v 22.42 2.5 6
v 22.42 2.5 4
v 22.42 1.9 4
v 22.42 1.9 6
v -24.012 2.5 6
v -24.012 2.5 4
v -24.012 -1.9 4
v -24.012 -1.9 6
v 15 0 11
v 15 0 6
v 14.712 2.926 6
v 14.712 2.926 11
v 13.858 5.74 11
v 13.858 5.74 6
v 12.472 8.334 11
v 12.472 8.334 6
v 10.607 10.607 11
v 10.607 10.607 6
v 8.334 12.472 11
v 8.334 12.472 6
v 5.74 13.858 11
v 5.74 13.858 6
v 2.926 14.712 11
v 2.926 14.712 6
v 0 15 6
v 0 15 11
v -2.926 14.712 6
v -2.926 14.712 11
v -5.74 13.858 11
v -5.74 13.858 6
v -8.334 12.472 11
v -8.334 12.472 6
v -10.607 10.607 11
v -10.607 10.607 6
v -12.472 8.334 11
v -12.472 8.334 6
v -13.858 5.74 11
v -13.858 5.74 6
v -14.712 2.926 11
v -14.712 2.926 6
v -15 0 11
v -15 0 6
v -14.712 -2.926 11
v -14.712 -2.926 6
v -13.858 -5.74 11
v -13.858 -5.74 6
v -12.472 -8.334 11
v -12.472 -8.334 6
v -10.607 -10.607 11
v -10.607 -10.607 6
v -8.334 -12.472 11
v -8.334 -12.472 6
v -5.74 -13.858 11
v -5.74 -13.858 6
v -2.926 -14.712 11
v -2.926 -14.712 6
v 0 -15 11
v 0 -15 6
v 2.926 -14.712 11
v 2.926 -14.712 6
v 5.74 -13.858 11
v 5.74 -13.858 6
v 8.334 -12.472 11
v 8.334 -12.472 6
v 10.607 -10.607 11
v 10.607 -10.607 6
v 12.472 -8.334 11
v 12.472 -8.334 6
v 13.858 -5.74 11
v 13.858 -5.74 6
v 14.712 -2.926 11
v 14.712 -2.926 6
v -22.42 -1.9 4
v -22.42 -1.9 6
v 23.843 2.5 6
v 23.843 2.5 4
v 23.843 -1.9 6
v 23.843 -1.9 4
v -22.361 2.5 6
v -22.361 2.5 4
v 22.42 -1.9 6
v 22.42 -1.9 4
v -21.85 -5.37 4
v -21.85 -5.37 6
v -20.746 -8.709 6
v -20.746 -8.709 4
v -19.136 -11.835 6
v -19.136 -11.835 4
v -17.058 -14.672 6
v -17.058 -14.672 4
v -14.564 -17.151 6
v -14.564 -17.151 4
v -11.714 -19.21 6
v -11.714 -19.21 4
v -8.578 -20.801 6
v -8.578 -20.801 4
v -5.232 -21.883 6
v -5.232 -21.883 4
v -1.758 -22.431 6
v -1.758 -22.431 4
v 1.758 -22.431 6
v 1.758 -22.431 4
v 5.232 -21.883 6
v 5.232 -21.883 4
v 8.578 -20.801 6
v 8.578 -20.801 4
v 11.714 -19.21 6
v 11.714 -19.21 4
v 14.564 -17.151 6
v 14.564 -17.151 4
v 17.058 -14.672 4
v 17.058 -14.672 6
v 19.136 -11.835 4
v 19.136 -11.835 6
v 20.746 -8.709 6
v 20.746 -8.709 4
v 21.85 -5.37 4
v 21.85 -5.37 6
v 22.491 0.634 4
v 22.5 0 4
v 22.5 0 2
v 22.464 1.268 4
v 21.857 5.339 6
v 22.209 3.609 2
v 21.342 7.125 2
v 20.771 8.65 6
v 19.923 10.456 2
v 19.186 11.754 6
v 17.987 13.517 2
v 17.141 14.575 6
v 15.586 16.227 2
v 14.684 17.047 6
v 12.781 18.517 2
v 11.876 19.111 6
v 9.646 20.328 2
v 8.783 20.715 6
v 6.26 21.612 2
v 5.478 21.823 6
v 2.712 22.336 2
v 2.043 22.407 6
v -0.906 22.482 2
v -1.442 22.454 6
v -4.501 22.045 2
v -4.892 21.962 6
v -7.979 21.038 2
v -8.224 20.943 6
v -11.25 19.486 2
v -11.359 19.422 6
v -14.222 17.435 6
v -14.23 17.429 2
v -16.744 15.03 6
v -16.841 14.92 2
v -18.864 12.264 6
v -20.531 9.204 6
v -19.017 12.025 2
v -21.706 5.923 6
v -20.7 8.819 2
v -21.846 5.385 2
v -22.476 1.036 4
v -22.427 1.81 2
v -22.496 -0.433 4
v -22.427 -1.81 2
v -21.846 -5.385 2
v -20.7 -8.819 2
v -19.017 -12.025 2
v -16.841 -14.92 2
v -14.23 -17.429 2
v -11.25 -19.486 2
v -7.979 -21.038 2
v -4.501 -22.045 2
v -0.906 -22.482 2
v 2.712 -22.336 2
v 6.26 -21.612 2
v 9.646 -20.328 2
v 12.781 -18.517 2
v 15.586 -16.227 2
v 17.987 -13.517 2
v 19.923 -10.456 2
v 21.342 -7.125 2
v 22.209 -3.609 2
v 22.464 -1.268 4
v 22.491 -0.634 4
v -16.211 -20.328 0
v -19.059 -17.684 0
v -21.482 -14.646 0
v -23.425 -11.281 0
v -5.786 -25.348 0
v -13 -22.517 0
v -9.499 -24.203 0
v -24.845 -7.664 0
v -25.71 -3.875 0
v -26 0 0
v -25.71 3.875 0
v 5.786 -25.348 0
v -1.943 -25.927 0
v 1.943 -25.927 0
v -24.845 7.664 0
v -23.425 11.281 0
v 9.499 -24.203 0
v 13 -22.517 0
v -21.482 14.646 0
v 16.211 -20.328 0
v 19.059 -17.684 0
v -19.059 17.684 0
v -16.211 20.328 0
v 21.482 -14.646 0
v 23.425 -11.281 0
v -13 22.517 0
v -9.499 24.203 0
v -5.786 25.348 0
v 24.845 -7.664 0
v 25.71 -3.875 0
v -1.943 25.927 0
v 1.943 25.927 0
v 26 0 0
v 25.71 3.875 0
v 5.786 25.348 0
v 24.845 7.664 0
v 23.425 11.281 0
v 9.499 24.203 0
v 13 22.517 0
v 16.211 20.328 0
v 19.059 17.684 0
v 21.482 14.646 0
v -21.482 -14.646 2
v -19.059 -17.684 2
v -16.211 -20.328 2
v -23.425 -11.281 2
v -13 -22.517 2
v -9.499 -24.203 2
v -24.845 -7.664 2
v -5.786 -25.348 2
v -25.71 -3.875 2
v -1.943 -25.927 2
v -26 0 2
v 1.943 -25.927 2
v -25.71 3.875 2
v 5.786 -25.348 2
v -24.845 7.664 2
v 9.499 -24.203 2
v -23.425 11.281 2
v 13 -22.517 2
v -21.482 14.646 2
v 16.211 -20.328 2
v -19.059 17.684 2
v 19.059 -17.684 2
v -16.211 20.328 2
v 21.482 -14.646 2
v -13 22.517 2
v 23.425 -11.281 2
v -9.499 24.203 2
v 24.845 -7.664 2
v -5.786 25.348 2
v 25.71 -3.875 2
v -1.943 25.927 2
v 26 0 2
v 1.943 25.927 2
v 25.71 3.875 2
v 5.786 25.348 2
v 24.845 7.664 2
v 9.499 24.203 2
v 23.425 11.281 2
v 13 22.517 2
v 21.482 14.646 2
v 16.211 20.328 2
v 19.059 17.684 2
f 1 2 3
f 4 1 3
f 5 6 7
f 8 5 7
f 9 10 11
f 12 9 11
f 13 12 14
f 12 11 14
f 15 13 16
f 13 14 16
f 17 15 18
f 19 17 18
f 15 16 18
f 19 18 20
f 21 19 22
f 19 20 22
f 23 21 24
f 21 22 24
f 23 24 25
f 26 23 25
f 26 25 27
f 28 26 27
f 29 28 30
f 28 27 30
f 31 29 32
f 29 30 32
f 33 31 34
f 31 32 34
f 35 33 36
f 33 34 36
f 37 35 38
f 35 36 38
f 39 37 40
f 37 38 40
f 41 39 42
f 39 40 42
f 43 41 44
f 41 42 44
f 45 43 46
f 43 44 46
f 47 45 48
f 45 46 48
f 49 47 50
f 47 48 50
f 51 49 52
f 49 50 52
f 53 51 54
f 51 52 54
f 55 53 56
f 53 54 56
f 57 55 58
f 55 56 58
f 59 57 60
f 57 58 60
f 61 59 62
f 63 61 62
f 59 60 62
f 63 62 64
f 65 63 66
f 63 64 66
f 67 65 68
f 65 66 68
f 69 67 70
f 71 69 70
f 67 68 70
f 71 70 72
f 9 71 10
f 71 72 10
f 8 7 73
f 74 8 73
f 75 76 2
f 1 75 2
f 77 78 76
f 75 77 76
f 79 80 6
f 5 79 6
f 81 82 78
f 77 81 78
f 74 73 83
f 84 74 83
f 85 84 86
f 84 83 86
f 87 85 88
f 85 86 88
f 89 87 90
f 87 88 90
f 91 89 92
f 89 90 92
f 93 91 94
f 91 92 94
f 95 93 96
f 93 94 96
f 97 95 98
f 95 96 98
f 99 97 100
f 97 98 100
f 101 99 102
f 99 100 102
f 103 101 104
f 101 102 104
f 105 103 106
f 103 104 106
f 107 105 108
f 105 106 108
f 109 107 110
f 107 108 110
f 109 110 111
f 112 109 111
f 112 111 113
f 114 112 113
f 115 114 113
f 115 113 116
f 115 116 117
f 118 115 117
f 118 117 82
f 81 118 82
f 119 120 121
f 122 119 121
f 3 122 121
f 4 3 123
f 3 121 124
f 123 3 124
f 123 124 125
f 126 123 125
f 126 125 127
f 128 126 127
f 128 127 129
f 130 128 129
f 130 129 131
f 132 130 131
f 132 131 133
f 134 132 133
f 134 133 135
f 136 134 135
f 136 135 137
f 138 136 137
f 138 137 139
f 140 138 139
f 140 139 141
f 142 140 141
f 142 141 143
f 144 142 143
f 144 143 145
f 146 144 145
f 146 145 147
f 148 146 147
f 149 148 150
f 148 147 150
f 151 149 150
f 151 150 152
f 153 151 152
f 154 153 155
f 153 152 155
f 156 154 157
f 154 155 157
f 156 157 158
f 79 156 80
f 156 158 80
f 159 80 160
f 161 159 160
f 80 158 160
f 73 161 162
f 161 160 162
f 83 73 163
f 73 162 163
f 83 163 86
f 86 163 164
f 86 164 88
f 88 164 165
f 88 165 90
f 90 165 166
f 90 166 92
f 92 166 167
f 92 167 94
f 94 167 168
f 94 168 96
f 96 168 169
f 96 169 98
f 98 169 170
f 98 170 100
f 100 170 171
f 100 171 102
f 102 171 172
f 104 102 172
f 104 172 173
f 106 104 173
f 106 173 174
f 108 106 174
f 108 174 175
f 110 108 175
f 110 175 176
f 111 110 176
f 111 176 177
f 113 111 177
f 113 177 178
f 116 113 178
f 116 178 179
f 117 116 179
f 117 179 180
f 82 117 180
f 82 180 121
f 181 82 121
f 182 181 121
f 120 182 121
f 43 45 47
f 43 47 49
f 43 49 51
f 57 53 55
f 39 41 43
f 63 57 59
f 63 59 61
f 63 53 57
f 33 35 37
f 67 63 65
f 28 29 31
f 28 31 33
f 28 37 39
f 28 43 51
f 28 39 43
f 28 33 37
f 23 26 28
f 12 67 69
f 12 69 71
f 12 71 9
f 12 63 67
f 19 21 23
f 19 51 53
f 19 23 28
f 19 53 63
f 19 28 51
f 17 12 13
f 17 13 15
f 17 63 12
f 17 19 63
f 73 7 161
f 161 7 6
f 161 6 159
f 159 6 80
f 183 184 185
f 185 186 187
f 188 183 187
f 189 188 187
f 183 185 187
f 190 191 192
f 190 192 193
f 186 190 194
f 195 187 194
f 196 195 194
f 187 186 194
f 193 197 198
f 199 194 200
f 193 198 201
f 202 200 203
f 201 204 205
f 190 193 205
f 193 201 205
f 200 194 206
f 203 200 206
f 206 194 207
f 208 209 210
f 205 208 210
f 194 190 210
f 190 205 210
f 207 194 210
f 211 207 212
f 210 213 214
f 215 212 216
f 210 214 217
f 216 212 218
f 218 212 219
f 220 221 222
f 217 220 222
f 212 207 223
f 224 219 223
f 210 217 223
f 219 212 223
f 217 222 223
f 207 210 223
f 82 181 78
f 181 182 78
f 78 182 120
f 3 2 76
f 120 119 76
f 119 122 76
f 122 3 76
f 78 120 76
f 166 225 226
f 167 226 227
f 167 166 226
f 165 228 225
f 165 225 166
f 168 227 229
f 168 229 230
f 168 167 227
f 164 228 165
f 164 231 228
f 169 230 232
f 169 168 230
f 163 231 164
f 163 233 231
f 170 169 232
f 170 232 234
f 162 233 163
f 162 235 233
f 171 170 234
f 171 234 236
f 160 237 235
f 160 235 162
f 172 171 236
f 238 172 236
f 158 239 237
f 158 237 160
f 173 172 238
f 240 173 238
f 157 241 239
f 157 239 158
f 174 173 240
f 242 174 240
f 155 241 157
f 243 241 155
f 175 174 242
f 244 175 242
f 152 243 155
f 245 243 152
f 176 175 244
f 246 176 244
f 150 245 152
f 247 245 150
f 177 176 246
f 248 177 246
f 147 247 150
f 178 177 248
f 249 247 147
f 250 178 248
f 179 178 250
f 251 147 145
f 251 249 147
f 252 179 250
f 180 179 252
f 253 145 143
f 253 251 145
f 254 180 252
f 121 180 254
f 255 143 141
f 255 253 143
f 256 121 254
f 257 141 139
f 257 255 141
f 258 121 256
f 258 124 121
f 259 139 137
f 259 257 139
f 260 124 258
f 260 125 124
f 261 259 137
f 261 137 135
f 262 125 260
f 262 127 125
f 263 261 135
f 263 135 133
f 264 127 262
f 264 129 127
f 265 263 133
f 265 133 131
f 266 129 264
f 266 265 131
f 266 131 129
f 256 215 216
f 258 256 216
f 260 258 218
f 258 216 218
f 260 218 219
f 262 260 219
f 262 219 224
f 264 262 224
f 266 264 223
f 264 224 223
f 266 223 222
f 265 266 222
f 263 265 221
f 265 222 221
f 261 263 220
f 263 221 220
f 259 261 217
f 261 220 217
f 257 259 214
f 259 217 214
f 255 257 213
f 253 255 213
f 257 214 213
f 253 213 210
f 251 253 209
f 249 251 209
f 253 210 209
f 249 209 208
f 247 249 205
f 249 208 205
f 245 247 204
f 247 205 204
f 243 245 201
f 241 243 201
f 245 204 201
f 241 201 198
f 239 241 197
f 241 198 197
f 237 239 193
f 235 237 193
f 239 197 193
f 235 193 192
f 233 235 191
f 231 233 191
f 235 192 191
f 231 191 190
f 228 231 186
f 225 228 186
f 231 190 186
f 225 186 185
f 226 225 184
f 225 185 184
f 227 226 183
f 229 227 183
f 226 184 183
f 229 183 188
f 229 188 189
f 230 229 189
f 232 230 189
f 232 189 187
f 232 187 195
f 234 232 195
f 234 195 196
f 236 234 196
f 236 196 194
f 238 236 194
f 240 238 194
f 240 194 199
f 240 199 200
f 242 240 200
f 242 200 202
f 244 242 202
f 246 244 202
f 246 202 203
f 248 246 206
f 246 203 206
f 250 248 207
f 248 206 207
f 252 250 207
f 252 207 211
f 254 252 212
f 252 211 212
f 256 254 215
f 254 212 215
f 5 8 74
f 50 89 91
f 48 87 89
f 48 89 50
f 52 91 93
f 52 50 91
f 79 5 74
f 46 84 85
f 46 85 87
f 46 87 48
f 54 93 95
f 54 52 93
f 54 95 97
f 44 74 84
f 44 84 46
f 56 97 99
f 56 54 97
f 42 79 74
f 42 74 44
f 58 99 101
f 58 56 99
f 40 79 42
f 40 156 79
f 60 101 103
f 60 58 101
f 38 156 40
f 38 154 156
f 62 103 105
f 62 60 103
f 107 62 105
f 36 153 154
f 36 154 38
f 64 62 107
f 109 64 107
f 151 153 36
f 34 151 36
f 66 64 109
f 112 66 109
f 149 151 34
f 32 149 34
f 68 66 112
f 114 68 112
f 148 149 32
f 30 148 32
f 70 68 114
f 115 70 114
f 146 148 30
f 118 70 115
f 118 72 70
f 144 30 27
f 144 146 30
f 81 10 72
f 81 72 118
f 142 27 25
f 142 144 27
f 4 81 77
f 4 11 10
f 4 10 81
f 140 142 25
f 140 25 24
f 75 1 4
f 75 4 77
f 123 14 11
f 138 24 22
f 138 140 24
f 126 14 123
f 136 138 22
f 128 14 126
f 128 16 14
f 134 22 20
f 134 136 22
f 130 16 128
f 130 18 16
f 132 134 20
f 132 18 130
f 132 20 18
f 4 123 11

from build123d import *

# Parameters (mm, degrees)
F0_R     = 26
F1_DEPTH = 2
F2_R     = 22.5
F3_DEPTH = 2
F5_DEPTH = 2
F6_R     = 15
F7_DEPTH = 5


with BuildPart() as f1:
    # F0 (on Top) → F1 (new body)
    with BuildSketch(Plane.XY):
        Circle(F0_R)
    extrude(amount=F1_DEPTH)

    # F2 (on face) → F3 (join)
    with BuildSketch(Plane.XY.offset(2)):
        Circle(F2_R)
    extrude(amount=F3_DEPTH)

    # F4 (on face) → F5 (join)
    with BuildSketch(Plane.XY.offset(4)):
        with BuildLine():
            Line((-22.3533584706, -1.8999999156), (-22.3533584706, 2.5002909302))
            Line((-22.3533584706, 2.5002909302), (-22.3606472461, 2.5002909302))
            ThreePointArc((-22.3606472461, 2.5002909302), (-22.4979786383, 0.3015911014), (-22.4196342593, -1.8999999156))
            Line((-22.4196342593, -1.8999999156), (-22.3533584706, -1.8999999156))
        make_face()
        with BuildLine():
            Line((-22.3606472461, 2.5002909302), (-22.3533584706, 2.5002909302))
            Line((-22.3533584706, 2.5002909302), (-22.3533584706, -1.8999999156))
            Line((-22.3533584706, -1.8999999156), (-22.4196342593, -1.8999999156))
            ThreePointArc((-22.4196342593, -1.8999999156), (0, -22.5), (22.4196342593, -1.8999999156))
            Line((22.4196342593, -1.8999999156), (22.4196342593, 1.8999999156))
            ThreePointArc((22.4196342593, 1.8999999156), (0.3015911015, 22.4979786383), (-22.3606472461, 2.5002909302))
        make_face()
        with BuildLine():
            ThreePointArc((-22.4196342593, -1.8999999156), (-22.4979786383, 0.3015911014), (-22.3606472461, 2.5002909302))
            Line((-22.3606472461, 2.5002909302), (-24.011714384, 2.5002909302))
            Line((-24.011714384, 2.5002909302), (-24.011714384, -1.8999999156))
            Line((-24.011714384, -1.8999999156), (-22.4196342593, -1.8999999156))
        make_face()
        with BuildLine():
            ThreePointArc((22.5, 0), (22.4798995865, 0.9508494008), (22.4196342593, 1.8999999156))
            Line((22.4196342593, 1.8999999156), (22.4196342593, -1.8999999156))
            ThreePointArc((22.4196342593, -1.8999999156), (22.4798995865, -0.9508494008), (22.5, 0))
        make_face()
        with BuildLine():
            Line((22.4196342593, 2.5002909302), (22.4196342593, 1.8999999156))
            ThreePointArc((22.4196342593, 1.8999999156), (22.4798995865, 0.9508494008), (22.5, 0))
            ThreePointArc((22.5, 0), (22.4798995865, -0.9508494008), (22.4196342593, -1.8999999156))
            Line((22.4196342593, -1.8999999156), (23.8429448439, -1.8999999156))
            Line((23.8429448439, -1.8999999156), (23.8429448439, 2.5002909302))
            Line((23.8429448439, 2.5002909302), (22.4196342593, 2.5002909302))
        make_face()
    extrude(amount=F5_DEPTH)

    # F6 (on face) → F7 (join)
    with BuildSketch(Plane.XY.offset(6)):
        Circle(F6_R)
    extrude(amount=F7_DEPTH)


solid = f1.part
